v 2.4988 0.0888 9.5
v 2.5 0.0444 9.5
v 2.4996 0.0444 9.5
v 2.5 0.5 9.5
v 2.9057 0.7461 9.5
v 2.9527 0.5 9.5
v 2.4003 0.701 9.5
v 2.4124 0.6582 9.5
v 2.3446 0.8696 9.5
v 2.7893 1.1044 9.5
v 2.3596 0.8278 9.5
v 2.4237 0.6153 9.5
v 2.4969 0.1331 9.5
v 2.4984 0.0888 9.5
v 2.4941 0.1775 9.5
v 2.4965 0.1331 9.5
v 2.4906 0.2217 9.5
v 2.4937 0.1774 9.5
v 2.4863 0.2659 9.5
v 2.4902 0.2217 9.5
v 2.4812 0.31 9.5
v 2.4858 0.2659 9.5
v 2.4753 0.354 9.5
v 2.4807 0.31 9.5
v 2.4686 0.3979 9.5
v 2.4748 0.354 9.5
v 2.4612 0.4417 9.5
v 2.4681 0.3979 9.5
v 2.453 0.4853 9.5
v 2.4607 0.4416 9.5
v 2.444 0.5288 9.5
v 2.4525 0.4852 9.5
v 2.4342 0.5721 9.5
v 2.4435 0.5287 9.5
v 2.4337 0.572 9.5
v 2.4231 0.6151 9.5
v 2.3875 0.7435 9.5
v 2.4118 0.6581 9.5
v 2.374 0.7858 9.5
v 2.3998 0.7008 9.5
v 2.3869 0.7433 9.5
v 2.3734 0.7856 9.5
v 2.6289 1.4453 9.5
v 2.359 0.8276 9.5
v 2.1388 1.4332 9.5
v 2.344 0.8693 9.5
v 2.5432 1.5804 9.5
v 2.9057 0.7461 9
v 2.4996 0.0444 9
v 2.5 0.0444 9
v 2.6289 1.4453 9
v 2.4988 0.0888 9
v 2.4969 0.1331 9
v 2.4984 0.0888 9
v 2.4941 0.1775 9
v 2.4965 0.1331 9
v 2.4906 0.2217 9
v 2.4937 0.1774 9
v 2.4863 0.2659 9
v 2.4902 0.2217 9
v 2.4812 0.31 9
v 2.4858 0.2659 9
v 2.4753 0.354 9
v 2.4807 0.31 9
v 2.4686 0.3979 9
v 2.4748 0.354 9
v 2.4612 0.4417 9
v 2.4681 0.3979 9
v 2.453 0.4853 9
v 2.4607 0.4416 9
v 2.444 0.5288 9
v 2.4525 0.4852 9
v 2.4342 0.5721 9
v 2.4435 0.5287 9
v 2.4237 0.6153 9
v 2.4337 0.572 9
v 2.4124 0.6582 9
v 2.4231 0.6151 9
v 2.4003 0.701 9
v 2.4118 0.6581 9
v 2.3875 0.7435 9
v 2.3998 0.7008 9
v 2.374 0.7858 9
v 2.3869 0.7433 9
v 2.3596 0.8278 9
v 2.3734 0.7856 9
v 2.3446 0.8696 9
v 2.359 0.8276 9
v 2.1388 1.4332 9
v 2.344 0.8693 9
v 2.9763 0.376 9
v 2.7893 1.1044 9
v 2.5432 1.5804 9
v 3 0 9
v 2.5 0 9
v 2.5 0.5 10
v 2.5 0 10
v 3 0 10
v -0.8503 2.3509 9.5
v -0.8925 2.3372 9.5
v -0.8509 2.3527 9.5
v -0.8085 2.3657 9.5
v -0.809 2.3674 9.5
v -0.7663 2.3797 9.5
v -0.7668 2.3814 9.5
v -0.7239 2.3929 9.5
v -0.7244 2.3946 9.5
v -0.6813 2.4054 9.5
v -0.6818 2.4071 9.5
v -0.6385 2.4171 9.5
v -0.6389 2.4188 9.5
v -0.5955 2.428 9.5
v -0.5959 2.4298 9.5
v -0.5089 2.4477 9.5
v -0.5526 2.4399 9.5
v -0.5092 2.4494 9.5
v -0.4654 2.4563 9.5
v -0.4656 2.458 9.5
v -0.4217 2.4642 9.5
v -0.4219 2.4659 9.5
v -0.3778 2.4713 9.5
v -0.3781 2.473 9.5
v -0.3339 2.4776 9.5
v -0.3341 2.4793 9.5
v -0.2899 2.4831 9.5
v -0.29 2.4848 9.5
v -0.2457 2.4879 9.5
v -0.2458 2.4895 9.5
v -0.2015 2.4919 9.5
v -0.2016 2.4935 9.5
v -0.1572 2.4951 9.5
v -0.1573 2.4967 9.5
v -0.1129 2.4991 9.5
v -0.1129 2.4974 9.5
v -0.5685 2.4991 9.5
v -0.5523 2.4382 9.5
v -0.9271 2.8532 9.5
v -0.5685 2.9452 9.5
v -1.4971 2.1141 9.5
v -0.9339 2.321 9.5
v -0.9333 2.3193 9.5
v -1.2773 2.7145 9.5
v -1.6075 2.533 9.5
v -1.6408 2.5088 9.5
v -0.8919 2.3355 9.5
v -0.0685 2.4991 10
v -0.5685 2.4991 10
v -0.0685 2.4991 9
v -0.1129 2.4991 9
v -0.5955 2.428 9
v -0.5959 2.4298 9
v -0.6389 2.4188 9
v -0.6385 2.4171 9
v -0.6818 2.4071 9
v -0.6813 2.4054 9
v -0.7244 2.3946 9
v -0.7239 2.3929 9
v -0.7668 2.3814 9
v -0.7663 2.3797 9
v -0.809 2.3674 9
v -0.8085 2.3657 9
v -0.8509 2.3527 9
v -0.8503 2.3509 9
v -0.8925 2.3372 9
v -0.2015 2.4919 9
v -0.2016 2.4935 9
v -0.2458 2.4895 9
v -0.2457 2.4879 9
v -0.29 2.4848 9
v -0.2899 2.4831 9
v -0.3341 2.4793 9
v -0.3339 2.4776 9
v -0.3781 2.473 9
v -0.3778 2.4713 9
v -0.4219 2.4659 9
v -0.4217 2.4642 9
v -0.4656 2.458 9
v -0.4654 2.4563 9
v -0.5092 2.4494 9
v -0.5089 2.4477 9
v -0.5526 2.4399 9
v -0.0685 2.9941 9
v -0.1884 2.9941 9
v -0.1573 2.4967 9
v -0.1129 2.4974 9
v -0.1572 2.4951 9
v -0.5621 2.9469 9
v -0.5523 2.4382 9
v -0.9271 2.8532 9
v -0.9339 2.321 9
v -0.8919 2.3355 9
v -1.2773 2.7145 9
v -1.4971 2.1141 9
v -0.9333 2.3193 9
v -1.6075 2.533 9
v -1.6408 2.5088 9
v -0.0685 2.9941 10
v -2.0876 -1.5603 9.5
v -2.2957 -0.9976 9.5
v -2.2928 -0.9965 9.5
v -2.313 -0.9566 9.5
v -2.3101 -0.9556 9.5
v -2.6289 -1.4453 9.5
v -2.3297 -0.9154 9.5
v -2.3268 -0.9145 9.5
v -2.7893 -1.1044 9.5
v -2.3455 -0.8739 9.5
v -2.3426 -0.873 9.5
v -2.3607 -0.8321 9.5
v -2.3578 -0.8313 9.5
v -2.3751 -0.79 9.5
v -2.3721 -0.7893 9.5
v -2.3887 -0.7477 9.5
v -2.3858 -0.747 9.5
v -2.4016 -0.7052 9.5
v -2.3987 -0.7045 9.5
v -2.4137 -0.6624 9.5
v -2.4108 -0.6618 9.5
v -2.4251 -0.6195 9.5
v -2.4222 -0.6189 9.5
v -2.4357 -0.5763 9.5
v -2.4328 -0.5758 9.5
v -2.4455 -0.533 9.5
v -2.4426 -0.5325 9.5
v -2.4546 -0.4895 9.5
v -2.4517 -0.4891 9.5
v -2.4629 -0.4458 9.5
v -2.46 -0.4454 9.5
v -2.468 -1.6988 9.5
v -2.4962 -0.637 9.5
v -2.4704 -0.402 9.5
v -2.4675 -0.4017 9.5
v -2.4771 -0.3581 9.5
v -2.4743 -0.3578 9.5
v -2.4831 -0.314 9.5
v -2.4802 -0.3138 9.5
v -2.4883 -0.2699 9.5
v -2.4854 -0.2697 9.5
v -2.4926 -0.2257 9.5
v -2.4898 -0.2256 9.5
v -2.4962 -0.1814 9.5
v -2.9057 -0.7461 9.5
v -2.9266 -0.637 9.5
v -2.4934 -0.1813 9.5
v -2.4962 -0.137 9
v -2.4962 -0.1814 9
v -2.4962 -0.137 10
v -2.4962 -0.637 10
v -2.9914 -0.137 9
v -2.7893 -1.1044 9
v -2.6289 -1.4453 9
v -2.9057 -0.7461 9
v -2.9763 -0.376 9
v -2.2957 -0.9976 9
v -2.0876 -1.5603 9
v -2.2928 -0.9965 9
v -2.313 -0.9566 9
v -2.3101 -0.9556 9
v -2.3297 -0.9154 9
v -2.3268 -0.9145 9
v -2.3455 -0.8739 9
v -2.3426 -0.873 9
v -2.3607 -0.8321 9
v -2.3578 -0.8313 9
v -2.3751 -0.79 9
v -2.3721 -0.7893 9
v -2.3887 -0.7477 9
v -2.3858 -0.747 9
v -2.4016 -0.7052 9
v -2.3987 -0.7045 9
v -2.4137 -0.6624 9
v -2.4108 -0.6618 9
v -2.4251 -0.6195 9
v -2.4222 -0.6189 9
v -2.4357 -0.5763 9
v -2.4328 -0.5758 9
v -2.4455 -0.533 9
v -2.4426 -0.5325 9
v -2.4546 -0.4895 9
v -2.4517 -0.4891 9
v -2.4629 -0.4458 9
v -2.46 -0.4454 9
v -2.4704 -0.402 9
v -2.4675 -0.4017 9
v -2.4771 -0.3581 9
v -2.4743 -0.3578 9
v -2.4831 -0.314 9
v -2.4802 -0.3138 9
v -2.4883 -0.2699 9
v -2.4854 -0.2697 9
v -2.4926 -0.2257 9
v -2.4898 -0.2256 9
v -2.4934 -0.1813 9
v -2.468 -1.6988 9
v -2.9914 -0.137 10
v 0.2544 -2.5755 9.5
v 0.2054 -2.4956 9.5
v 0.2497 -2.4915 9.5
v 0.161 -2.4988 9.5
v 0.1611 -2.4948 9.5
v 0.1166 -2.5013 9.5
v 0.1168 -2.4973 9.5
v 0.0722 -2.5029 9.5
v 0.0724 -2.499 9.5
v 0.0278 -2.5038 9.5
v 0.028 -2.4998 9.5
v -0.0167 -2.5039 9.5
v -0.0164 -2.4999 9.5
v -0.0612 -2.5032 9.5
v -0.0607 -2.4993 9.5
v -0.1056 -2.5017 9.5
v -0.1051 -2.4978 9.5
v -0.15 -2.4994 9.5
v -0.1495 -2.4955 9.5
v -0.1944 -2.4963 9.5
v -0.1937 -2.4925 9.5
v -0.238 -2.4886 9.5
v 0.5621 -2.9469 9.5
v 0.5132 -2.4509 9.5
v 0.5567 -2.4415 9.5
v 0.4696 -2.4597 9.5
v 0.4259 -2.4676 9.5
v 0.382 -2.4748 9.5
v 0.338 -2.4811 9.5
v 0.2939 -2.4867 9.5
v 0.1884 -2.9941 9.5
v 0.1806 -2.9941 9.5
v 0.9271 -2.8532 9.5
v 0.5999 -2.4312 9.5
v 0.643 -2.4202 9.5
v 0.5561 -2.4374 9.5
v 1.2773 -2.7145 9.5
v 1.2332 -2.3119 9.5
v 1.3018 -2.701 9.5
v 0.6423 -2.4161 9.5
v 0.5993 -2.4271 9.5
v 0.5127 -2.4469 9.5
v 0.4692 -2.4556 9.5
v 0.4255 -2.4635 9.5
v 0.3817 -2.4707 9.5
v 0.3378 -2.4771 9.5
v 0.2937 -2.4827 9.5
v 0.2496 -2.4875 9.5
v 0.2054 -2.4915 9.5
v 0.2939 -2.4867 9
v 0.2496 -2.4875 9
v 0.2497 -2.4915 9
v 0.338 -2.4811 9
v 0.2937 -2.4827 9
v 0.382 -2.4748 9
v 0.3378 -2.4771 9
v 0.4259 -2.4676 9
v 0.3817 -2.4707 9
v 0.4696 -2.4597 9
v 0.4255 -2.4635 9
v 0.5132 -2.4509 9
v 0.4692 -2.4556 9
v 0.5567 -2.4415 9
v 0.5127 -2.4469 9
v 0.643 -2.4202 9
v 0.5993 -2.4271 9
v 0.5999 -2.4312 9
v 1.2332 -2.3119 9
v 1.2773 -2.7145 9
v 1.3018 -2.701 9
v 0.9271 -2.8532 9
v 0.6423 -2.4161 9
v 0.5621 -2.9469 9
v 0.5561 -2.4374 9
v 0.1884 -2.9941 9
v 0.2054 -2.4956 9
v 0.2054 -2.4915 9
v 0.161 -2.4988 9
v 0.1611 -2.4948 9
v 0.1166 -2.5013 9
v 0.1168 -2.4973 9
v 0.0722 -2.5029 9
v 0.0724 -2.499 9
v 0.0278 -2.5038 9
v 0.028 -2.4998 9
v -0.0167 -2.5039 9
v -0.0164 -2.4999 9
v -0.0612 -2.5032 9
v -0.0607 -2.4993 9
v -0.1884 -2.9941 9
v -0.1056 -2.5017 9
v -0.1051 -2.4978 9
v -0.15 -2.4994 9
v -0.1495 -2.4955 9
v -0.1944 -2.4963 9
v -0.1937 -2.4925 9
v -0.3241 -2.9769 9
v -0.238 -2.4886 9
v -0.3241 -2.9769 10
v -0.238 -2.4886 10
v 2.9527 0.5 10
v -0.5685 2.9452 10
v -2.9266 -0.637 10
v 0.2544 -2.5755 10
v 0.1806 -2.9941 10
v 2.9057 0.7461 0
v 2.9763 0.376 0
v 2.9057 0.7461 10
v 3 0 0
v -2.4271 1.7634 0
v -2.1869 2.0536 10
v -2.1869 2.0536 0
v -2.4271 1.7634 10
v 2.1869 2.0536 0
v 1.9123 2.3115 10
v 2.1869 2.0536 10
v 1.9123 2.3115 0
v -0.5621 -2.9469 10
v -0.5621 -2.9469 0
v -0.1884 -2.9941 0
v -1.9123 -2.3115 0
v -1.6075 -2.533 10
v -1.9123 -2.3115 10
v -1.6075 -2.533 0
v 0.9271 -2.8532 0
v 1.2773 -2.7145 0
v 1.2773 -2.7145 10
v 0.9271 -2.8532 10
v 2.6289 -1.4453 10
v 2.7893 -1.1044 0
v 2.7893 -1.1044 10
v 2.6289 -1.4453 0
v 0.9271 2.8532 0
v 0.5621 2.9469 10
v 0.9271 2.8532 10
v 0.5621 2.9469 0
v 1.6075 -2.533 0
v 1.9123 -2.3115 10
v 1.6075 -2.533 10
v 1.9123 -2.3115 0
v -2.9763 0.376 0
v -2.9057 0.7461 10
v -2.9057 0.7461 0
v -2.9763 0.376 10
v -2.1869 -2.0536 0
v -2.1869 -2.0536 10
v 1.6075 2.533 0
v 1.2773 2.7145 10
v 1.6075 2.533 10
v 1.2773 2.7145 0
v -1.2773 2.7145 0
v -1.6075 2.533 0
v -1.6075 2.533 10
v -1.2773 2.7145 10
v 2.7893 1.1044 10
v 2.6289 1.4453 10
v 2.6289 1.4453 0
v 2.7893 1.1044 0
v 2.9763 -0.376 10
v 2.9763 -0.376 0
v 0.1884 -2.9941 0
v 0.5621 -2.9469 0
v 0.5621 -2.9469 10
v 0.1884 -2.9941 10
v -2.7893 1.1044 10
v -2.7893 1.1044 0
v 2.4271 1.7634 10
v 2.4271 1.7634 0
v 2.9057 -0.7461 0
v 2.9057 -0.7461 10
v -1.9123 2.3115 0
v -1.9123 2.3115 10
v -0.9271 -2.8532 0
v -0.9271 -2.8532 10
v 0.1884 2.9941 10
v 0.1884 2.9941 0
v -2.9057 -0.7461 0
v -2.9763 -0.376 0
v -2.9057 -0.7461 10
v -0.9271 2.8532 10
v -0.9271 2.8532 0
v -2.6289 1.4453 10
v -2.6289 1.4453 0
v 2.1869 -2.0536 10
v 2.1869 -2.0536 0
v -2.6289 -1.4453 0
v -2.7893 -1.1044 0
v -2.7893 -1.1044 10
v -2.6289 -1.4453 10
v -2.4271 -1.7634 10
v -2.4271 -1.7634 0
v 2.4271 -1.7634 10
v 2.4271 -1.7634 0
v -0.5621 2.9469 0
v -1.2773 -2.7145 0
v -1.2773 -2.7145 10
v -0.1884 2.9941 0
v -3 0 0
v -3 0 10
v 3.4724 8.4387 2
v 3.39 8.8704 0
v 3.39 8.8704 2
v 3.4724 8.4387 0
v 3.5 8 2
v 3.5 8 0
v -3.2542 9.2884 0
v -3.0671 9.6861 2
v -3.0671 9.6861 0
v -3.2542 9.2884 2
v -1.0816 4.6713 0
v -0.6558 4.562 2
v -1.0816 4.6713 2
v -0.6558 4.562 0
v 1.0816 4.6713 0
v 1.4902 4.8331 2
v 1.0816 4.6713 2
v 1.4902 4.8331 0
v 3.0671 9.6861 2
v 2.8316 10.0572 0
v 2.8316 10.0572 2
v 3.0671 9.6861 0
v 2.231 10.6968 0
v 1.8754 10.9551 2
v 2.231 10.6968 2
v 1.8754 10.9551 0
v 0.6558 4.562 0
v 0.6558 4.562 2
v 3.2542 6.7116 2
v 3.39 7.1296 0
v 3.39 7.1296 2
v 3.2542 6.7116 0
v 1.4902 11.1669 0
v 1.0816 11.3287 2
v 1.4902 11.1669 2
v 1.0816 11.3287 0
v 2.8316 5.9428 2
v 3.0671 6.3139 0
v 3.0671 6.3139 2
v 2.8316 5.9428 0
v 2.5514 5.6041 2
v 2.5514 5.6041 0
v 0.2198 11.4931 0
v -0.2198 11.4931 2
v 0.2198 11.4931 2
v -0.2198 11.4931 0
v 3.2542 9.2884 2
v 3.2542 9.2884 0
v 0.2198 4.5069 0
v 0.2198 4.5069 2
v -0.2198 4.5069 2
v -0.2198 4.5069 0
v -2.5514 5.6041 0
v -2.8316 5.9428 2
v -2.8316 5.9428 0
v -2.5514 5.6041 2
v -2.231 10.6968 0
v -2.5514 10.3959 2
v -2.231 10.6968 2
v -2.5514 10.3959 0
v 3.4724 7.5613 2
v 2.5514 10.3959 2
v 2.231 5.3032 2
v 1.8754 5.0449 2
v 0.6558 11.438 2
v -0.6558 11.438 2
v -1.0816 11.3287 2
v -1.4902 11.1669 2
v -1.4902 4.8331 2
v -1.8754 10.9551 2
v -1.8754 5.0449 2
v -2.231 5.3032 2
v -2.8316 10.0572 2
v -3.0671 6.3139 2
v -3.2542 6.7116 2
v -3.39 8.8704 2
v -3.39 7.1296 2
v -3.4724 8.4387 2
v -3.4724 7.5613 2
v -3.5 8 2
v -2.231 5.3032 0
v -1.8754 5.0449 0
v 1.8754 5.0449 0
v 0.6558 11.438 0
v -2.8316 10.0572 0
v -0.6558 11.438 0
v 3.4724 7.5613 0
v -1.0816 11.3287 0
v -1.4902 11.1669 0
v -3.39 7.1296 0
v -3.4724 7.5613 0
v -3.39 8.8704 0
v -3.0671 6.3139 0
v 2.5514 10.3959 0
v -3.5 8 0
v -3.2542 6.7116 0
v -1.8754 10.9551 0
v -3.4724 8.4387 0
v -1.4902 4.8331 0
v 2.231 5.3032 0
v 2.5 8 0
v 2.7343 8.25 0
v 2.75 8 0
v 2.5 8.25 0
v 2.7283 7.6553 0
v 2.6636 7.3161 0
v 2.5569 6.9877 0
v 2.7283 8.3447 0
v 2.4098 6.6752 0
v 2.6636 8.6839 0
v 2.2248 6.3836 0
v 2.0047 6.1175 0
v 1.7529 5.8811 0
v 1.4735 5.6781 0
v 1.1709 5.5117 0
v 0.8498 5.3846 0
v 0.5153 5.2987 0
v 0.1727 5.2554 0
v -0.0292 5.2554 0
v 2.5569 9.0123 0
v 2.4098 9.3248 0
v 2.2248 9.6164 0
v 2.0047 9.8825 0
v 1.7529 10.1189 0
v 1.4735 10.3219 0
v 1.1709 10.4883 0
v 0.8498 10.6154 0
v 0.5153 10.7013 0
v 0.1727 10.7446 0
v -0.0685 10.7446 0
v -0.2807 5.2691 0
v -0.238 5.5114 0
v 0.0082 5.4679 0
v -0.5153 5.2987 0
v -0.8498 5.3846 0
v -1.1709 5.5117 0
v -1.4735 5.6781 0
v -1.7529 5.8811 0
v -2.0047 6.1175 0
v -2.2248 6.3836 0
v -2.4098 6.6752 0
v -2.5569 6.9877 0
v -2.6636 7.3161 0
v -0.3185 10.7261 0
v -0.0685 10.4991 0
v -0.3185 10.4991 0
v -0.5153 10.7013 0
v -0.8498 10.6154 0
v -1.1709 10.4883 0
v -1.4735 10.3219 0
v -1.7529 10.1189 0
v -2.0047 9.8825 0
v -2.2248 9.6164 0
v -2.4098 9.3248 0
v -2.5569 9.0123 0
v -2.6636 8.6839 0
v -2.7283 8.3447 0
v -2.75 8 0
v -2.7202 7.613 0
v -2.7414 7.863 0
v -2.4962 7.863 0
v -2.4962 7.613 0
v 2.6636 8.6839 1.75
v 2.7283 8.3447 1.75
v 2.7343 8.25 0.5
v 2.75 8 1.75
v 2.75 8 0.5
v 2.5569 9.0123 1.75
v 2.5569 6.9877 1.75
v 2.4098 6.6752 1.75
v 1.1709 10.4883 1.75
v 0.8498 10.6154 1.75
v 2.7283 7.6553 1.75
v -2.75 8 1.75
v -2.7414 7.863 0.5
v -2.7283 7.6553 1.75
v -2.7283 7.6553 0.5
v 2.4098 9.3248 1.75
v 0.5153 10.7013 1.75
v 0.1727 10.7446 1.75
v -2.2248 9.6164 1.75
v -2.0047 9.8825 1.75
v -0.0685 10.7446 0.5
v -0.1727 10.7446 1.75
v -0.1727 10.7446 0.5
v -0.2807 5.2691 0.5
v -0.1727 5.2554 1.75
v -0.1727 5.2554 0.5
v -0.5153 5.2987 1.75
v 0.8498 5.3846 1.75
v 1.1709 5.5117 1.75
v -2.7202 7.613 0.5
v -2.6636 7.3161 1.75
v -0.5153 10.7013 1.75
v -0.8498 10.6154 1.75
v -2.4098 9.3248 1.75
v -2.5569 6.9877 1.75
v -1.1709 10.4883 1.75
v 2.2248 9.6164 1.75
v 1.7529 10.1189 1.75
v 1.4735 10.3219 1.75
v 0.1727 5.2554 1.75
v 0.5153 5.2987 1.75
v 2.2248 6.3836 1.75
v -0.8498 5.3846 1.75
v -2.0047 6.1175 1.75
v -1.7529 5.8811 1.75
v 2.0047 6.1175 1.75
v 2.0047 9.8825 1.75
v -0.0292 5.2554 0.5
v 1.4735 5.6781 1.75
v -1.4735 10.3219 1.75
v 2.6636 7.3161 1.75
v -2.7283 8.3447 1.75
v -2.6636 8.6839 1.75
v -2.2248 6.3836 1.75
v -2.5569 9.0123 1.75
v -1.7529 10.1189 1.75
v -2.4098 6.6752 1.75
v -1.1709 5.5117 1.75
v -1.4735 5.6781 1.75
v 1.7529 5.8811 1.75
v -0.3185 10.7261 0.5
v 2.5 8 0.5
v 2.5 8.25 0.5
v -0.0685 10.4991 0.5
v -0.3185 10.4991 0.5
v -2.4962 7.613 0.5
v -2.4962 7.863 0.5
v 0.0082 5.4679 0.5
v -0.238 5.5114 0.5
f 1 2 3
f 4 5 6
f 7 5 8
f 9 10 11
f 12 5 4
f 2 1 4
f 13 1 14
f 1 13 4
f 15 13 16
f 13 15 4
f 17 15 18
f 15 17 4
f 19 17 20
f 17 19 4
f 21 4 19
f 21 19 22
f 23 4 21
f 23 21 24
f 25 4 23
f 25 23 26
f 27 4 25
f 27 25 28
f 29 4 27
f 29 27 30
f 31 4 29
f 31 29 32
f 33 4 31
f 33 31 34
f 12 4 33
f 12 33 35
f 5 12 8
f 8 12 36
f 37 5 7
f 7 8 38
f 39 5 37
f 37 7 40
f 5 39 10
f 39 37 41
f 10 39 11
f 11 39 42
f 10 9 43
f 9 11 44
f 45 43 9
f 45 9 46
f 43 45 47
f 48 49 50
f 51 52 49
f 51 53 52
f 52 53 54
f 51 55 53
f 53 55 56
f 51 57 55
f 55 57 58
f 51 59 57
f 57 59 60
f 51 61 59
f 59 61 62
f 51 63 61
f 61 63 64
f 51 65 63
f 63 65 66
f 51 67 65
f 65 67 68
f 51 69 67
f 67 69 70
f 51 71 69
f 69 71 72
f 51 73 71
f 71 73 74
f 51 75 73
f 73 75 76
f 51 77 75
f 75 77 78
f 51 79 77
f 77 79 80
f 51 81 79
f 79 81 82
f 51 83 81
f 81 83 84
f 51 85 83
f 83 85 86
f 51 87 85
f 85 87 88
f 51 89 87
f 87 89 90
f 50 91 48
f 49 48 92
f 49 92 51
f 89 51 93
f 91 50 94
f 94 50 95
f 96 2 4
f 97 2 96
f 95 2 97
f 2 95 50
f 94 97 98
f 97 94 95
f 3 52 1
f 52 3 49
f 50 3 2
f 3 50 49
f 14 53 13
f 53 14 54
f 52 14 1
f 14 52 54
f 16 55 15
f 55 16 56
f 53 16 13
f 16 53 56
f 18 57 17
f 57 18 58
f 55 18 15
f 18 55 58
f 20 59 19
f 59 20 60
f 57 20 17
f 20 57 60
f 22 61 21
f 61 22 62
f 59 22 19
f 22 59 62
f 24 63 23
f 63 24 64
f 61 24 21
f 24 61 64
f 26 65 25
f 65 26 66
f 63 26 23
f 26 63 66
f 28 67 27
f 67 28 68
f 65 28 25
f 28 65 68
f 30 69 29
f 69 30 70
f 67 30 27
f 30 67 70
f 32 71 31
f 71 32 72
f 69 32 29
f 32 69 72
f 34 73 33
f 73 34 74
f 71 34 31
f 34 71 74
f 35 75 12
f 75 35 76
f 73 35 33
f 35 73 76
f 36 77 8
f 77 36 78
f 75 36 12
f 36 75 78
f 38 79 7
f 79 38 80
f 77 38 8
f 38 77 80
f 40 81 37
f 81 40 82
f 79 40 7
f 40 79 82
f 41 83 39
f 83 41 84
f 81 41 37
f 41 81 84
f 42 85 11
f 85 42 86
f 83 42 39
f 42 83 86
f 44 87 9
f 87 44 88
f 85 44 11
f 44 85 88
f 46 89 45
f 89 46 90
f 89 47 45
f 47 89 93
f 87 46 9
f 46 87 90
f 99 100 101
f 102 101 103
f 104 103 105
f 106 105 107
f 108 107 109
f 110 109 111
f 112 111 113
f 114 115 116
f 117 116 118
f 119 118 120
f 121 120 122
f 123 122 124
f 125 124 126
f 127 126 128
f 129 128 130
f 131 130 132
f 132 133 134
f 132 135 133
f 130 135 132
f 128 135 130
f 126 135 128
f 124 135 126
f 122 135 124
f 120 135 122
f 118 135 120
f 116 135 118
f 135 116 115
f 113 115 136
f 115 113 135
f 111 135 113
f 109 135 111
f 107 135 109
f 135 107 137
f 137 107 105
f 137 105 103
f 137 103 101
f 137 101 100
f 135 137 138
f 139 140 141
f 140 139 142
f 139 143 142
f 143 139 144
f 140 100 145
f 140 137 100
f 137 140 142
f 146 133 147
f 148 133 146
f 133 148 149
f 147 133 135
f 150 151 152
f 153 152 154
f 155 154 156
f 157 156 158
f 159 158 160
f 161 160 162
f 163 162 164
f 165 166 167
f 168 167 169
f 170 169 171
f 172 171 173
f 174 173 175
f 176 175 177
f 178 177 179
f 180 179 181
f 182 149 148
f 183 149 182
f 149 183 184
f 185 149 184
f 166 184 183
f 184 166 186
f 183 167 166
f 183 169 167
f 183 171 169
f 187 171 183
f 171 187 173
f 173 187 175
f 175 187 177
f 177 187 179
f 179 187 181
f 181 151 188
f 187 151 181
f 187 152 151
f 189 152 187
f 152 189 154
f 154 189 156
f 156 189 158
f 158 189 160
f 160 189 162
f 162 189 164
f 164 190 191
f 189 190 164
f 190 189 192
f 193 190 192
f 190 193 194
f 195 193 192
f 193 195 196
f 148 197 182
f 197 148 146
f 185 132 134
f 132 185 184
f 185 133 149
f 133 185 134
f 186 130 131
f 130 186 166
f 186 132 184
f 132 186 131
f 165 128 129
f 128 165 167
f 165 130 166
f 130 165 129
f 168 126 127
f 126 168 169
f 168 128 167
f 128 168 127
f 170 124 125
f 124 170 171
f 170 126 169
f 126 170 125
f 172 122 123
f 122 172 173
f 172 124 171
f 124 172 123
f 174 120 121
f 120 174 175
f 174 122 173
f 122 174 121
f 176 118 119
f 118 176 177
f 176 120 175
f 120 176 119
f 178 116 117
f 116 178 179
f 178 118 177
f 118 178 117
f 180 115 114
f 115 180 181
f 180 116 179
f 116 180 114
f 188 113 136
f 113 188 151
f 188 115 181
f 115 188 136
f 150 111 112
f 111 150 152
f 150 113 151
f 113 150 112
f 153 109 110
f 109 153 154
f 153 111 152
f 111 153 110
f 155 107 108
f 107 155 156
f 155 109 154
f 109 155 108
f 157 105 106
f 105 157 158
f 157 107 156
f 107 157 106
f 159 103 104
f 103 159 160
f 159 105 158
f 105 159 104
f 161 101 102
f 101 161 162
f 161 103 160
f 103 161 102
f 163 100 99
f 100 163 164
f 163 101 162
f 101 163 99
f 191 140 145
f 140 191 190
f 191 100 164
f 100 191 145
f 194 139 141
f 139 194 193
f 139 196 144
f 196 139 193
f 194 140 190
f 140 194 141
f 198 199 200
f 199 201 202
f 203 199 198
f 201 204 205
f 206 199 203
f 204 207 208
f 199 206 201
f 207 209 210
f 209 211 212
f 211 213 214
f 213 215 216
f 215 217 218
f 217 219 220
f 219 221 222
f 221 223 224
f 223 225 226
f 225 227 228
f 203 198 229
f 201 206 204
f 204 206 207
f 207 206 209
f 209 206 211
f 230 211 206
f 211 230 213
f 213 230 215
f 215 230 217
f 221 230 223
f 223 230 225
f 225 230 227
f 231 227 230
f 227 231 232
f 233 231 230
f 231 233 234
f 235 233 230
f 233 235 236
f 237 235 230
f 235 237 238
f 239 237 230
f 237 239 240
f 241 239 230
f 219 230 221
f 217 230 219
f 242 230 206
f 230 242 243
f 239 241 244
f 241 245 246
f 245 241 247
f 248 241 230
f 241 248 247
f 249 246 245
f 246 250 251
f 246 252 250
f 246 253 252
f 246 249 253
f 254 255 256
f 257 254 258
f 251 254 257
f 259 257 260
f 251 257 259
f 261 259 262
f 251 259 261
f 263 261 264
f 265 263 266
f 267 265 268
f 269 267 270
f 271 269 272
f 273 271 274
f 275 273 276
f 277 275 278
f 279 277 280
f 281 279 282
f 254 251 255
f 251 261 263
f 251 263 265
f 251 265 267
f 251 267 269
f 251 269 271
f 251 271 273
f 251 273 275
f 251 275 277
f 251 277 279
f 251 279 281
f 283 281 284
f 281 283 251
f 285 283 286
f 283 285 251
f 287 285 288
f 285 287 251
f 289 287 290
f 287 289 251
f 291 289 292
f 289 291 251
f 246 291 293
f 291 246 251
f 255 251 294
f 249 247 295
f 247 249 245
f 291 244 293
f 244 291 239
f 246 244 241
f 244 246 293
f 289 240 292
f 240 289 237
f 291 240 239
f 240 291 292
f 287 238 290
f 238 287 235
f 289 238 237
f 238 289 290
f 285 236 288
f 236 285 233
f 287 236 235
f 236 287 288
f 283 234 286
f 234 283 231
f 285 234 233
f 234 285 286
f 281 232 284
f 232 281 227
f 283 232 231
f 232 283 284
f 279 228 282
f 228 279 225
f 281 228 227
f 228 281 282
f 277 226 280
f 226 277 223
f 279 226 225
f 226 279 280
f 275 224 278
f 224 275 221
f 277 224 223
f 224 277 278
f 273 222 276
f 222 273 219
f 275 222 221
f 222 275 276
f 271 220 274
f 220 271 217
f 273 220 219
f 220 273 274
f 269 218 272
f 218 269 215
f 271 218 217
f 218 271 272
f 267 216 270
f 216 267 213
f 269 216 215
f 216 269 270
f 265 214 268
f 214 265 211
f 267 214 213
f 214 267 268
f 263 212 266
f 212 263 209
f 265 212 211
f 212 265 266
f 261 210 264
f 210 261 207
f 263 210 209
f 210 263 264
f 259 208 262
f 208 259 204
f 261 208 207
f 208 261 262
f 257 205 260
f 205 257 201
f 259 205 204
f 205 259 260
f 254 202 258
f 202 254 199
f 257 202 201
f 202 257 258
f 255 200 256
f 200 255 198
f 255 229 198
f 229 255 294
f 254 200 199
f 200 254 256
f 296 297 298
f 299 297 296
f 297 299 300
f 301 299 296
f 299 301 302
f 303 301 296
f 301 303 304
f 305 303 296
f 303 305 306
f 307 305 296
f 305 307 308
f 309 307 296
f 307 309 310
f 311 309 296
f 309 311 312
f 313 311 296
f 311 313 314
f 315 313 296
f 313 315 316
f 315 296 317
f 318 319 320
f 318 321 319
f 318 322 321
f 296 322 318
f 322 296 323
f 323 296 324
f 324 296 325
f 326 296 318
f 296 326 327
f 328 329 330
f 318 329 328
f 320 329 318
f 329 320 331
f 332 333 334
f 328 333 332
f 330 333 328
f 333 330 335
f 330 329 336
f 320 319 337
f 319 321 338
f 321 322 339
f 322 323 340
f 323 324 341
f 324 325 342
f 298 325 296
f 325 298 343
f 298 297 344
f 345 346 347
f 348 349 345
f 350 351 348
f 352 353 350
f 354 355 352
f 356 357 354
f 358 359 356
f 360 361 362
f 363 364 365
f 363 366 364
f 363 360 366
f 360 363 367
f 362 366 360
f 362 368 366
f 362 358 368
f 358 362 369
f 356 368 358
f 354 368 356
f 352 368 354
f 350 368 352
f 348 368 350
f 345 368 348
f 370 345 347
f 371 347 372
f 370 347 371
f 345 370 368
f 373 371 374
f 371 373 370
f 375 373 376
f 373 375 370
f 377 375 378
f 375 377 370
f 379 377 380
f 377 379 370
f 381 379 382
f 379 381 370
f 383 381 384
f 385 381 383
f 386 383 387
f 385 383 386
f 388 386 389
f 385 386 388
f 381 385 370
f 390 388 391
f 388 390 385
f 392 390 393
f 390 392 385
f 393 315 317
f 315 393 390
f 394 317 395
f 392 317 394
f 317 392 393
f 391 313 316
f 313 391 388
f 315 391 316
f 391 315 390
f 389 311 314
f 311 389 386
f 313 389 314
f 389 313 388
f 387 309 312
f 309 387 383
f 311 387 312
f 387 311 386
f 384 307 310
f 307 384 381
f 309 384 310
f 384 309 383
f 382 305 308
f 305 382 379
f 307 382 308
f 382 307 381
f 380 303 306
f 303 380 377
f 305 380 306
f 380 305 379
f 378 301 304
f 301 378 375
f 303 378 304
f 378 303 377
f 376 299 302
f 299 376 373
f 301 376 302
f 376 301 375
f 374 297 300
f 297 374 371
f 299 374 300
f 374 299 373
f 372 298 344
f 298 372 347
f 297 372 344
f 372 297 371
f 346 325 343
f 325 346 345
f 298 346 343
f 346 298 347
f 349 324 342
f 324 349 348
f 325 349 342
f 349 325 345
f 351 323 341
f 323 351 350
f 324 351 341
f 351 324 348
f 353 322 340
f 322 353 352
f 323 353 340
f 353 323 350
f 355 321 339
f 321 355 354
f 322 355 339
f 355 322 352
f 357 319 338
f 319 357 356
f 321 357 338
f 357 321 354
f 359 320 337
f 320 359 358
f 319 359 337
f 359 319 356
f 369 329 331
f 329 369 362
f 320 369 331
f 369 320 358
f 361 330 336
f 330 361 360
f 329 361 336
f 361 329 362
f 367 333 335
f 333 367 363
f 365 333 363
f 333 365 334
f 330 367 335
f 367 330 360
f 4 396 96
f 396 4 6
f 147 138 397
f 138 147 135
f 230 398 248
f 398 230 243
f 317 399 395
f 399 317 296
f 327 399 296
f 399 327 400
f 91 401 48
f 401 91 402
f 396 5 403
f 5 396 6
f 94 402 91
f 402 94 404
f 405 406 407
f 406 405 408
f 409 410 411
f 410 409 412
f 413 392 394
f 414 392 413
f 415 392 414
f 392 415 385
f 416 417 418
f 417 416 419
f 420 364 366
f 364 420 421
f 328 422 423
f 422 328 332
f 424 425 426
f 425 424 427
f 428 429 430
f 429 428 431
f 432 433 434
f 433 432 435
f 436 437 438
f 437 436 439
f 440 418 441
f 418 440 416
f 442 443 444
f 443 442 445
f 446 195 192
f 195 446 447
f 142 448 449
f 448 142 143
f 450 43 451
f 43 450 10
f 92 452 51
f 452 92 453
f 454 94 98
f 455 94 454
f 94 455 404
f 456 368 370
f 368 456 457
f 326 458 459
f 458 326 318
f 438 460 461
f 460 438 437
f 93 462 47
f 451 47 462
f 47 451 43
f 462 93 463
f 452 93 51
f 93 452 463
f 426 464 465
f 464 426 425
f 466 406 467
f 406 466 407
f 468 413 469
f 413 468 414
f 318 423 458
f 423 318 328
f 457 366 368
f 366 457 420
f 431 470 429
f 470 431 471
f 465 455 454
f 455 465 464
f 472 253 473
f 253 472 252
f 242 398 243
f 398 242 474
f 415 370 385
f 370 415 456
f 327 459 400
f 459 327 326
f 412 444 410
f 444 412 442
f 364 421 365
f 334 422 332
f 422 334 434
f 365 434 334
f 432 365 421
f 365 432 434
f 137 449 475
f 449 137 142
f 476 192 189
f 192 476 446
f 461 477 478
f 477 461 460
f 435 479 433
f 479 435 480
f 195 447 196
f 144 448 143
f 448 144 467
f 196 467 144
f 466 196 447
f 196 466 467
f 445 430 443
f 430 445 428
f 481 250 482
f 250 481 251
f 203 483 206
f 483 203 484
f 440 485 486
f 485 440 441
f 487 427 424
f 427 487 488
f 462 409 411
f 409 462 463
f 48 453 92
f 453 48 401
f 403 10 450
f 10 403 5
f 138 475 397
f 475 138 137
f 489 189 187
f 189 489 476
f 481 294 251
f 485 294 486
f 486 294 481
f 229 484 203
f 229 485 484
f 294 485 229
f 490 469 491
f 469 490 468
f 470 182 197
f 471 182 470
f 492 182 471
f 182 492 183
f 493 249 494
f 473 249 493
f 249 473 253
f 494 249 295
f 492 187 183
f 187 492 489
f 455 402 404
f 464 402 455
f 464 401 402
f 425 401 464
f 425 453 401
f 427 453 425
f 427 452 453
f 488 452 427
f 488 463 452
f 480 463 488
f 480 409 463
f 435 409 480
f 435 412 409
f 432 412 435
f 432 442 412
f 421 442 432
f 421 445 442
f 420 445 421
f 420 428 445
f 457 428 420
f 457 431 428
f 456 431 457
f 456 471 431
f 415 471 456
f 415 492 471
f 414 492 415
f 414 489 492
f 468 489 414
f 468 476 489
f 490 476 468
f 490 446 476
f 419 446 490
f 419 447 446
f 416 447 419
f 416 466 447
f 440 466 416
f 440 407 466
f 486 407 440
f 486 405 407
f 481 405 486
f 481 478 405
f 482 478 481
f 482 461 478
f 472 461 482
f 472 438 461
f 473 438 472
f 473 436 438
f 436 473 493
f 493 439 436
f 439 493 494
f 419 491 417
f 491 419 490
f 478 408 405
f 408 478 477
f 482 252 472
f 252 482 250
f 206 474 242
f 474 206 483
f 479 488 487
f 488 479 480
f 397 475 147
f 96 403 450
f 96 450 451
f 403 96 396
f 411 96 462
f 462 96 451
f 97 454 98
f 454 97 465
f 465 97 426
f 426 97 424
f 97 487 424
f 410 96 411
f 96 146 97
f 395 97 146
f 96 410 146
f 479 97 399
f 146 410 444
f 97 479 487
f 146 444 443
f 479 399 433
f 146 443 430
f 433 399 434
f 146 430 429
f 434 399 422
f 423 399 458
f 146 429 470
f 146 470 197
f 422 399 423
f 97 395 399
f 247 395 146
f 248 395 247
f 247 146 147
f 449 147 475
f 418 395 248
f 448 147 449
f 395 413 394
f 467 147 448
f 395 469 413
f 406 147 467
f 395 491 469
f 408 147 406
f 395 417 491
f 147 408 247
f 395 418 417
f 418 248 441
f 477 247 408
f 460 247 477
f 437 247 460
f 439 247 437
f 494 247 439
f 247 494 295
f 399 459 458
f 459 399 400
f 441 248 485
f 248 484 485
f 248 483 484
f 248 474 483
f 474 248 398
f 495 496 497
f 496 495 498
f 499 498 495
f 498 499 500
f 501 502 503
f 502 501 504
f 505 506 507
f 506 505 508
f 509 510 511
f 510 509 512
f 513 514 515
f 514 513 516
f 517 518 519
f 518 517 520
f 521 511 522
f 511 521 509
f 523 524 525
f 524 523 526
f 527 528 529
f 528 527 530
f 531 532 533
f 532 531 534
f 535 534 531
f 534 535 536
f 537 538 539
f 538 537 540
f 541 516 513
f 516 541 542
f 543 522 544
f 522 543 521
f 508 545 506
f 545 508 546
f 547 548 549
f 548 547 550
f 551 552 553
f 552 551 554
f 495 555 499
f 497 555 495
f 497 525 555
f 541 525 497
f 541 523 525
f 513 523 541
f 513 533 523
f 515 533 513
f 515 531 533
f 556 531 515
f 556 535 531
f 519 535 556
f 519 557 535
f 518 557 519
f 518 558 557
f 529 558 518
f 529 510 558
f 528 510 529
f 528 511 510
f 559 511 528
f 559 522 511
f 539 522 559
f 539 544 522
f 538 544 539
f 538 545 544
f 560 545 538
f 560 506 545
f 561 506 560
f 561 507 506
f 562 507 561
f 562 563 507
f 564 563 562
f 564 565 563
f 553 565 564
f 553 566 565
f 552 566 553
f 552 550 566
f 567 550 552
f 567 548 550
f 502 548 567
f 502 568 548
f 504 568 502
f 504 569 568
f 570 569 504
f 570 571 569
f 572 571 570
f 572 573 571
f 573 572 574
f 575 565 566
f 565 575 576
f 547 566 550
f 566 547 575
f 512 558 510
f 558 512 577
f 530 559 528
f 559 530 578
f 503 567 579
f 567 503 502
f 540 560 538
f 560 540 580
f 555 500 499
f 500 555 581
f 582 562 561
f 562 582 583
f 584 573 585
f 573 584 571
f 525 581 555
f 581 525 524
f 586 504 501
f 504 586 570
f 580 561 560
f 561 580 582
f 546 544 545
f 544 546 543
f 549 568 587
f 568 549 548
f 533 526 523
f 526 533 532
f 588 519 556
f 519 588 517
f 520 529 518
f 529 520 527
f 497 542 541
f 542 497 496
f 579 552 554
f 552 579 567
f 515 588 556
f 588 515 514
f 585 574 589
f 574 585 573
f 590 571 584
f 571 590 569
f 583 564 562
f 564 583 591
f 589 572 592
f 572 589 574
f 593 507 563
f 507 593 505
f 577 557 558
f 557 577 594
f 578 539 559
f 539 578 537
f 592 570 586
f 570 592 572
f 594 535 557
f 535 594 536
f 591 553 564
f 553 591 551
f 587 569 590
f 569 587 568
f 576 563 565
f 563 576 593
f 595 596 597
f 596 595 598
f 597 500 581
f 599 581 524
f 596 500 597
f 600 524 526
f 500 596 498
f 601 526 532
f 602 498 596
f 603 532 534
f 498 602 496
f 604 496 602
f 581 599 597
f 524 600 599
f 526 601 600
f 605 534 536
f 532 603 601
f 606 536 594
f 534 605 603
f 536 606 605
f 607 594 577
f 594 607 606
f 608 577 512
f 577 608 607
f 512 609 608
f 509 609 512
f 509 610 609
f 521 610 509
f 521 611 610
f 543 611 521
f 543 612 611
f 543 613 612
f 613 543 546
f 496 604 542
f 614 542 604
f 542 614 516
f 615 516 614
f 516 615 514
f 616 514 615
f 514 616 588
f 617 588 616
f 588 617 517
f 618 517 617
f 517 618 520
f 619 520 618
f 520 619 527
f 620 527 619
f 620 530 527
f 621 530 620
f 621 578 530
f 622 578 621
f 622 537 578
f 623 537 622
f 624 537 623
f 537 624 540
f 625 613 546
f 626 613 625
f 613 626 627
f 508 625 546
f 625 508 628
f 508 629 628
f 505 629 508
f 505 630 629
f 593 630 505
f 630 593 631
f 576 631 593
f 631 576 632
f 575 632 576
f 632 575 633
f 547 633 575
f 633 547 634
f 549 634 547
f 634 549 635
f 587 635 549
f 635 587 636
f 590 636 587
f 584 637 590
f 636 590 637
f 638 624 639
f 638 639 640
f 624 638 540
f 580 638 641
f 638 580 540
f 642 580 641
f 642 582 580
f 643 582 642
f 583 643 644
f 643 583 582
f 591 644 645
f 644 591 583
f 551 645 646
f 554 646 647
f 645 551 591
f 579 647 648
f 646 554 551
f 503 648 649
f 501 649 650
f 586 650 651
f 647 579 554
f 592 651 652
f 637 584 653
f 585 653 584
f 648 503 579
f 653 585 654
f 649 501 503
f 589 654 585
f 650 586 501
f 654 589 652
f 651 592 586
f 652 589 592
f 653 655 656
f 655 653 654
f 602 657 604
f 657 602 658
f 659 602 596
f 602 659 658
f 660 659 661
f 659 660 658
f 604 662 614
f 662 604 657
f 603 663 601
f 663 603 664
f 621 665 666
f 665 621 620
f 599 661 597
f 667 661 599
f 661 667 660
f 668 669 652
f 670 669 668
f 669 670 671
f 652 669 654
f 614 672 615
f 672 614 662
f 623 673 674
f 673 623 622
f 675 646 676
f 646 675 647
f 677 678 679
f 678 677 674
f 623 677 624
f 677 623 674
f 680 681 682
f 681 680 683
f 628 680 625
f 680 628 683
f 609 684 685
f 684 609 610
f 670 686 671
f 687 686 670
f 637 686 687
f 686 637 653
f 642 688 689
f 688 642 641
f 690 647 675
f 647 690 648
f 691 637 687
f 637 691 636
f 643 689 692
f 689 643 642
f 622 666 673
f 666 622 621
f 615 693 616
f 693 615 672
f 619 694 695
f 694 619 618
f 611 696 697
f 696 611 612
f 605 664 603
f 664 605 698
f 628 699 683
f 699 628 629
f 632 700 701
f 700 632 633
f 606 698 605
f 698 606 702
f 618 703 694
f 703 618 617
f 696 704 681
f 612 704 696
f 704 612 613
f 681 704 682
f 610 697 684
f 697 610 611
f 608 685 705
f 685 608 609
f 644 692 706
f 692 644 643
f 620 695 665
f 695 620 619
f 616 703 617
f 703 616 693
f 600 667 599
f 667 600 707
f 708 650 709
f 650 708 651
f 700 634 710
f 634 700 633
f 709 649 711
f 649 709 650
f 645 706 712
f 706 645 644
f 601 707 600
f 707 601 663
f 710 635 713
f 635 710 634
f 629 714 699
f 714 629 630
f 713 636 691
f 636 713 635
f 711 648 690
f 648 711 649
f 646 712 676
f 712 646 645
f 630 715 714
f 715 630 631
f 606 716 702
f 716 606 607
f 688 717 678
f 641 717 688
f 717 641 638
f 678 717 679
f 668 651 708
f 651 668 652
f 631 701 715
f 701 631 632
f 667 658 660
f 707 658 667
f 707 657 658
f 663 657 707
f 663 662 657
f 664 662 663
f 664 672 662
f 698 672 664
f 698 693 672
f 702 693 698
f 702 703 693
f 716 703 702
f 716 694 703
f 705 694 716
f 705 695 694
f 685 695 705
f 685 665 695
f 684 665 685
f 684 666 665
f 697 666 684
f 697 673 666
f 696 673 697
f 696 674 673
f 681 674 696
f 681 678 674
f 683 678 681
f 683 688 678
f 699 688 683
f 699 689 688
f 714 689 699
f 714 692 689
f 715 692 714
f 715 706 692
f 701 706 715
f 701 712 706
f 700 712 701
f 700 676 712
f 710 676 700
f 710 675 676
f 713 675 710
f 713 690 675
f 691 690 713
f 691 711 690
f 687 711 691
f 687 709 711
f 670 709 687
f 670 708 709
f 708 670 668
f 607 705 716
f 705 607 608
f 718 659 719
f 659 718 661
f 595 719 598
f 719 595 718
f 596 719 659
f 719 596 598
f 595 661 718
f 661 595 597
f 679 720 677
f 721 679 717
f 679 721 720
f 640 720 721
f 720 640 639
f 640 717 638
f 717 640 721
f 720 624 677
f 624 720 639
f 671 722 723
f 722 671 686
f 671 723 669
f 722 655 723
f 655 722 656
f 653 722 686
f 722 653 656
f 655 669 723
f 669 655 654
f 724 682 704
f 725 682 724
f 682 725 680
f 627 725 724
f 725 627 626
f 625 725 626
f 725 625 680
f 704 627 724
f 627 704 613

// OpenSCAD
$fn = 50;

// Curved vertical slot on outer wall
module curved_vertical_slot(r=20, h=10, slot_depth=.5, slot_width=.5, length=1, angle=0) {
    for (i = [0 : length - 1]) {
        z = h - length + i;
        a = angle * PI / 180;
        x = (r - slot_depth ) * cos(a);
        y = (r - slot_depth) * sin(a);

        rotate([0, 0, angle])
        translate([x, y, z])
            cube([slot_depth, slot_width, 1.1], center=false);
    }
}

// Curved horizontal leg of the L-slot
module curved_horizontal_slot(r=20, slot_depth=.5, slot_width=.6, arc_span=20, angle=0, start_z=8.6) {
    for (a = [0 : 1 : arc_span]) {
        current_angle = angle + a;
        a_rad = current_angle * PI / 180;
        x = (r - slot_depth) * cos(a_rad);
        y = (r - slot_depth) * sin(a_rad);

        rotate([0, 0, current_angle])
        translate([x, y, start_z])
            cube([slot_depth, slot_width, slot_depth], center=false);
    }
}

// Base cylinder with curved L-notch
module base_with_l_notch(height = 10, radius = 3) {
  
  vertical_slot_height = 1;
  
  difference() {
  
   cylinder(h=height, r=radius);
    union() {
        curved_vertical_slot(r = radius, h = height, length = vertical_slot_height);
        curved_horizontal_slot(r  = radius, start_z = height - vertical_slot_height);
      
       curved_vertical_slot(r = radius, angle = 90, h = height, length = vertical_slot_height);
       curved_horizontal_slot(r = radius, angle = 90, start_z = height  - vertical_slot_height);
      
        curved_vertical_slot(r = radius, angle = 180, h = height, length = vertical_slot_height);
        curved_horizontal_slot(r = radius, angle = 180, start_z = height  - vertical_slot_height);
      
        curved_vertical_slot(r = radius, angle = 260, h = height, length = vertical_slot_height);
        curved_horizontal_slot(r = radius, angle = 260, start_z = height  - vertical_slot_height);
     }
   }
}

// Cap with internal notch lug
module cap_with_internal_lug(r=3, cap_thickness = .5, h=2, wall=.25, lug_depth=.25, lug_width=.25, lug_height=.5, angle=0) {
    difference() {
        // Outer shell
        cylinder(h=h, r=r + cap_thickness);

        // Hollow cavity
        translate([0, 0, - wall])
            cylinder(h=h, r= r - wall);
    }

    // Internal lug
    a_rad = angle * PI / 180;
    x = (r - wall - lug_depth) * cos(a_rad);
    y = (r - wall - lug_depth) * sin(a_rad);

    rotate([0, 0, angle])
    translate([x, y, 0])
        cube([lug_depth, lug_width, lug_height], center=false);
}

module cap_with_four_lugs() {
    union() {
      cap_with_internal_lug();
      cap_with_internal_lug(angle=90);
      cap_with_internal_lug(angle=180);
      cap_with_internal_lug(angle=260);
    }
}

// Assembly
base_with_l_notch();

translate([0, 8, 0])
cap_with_four_lugs();
